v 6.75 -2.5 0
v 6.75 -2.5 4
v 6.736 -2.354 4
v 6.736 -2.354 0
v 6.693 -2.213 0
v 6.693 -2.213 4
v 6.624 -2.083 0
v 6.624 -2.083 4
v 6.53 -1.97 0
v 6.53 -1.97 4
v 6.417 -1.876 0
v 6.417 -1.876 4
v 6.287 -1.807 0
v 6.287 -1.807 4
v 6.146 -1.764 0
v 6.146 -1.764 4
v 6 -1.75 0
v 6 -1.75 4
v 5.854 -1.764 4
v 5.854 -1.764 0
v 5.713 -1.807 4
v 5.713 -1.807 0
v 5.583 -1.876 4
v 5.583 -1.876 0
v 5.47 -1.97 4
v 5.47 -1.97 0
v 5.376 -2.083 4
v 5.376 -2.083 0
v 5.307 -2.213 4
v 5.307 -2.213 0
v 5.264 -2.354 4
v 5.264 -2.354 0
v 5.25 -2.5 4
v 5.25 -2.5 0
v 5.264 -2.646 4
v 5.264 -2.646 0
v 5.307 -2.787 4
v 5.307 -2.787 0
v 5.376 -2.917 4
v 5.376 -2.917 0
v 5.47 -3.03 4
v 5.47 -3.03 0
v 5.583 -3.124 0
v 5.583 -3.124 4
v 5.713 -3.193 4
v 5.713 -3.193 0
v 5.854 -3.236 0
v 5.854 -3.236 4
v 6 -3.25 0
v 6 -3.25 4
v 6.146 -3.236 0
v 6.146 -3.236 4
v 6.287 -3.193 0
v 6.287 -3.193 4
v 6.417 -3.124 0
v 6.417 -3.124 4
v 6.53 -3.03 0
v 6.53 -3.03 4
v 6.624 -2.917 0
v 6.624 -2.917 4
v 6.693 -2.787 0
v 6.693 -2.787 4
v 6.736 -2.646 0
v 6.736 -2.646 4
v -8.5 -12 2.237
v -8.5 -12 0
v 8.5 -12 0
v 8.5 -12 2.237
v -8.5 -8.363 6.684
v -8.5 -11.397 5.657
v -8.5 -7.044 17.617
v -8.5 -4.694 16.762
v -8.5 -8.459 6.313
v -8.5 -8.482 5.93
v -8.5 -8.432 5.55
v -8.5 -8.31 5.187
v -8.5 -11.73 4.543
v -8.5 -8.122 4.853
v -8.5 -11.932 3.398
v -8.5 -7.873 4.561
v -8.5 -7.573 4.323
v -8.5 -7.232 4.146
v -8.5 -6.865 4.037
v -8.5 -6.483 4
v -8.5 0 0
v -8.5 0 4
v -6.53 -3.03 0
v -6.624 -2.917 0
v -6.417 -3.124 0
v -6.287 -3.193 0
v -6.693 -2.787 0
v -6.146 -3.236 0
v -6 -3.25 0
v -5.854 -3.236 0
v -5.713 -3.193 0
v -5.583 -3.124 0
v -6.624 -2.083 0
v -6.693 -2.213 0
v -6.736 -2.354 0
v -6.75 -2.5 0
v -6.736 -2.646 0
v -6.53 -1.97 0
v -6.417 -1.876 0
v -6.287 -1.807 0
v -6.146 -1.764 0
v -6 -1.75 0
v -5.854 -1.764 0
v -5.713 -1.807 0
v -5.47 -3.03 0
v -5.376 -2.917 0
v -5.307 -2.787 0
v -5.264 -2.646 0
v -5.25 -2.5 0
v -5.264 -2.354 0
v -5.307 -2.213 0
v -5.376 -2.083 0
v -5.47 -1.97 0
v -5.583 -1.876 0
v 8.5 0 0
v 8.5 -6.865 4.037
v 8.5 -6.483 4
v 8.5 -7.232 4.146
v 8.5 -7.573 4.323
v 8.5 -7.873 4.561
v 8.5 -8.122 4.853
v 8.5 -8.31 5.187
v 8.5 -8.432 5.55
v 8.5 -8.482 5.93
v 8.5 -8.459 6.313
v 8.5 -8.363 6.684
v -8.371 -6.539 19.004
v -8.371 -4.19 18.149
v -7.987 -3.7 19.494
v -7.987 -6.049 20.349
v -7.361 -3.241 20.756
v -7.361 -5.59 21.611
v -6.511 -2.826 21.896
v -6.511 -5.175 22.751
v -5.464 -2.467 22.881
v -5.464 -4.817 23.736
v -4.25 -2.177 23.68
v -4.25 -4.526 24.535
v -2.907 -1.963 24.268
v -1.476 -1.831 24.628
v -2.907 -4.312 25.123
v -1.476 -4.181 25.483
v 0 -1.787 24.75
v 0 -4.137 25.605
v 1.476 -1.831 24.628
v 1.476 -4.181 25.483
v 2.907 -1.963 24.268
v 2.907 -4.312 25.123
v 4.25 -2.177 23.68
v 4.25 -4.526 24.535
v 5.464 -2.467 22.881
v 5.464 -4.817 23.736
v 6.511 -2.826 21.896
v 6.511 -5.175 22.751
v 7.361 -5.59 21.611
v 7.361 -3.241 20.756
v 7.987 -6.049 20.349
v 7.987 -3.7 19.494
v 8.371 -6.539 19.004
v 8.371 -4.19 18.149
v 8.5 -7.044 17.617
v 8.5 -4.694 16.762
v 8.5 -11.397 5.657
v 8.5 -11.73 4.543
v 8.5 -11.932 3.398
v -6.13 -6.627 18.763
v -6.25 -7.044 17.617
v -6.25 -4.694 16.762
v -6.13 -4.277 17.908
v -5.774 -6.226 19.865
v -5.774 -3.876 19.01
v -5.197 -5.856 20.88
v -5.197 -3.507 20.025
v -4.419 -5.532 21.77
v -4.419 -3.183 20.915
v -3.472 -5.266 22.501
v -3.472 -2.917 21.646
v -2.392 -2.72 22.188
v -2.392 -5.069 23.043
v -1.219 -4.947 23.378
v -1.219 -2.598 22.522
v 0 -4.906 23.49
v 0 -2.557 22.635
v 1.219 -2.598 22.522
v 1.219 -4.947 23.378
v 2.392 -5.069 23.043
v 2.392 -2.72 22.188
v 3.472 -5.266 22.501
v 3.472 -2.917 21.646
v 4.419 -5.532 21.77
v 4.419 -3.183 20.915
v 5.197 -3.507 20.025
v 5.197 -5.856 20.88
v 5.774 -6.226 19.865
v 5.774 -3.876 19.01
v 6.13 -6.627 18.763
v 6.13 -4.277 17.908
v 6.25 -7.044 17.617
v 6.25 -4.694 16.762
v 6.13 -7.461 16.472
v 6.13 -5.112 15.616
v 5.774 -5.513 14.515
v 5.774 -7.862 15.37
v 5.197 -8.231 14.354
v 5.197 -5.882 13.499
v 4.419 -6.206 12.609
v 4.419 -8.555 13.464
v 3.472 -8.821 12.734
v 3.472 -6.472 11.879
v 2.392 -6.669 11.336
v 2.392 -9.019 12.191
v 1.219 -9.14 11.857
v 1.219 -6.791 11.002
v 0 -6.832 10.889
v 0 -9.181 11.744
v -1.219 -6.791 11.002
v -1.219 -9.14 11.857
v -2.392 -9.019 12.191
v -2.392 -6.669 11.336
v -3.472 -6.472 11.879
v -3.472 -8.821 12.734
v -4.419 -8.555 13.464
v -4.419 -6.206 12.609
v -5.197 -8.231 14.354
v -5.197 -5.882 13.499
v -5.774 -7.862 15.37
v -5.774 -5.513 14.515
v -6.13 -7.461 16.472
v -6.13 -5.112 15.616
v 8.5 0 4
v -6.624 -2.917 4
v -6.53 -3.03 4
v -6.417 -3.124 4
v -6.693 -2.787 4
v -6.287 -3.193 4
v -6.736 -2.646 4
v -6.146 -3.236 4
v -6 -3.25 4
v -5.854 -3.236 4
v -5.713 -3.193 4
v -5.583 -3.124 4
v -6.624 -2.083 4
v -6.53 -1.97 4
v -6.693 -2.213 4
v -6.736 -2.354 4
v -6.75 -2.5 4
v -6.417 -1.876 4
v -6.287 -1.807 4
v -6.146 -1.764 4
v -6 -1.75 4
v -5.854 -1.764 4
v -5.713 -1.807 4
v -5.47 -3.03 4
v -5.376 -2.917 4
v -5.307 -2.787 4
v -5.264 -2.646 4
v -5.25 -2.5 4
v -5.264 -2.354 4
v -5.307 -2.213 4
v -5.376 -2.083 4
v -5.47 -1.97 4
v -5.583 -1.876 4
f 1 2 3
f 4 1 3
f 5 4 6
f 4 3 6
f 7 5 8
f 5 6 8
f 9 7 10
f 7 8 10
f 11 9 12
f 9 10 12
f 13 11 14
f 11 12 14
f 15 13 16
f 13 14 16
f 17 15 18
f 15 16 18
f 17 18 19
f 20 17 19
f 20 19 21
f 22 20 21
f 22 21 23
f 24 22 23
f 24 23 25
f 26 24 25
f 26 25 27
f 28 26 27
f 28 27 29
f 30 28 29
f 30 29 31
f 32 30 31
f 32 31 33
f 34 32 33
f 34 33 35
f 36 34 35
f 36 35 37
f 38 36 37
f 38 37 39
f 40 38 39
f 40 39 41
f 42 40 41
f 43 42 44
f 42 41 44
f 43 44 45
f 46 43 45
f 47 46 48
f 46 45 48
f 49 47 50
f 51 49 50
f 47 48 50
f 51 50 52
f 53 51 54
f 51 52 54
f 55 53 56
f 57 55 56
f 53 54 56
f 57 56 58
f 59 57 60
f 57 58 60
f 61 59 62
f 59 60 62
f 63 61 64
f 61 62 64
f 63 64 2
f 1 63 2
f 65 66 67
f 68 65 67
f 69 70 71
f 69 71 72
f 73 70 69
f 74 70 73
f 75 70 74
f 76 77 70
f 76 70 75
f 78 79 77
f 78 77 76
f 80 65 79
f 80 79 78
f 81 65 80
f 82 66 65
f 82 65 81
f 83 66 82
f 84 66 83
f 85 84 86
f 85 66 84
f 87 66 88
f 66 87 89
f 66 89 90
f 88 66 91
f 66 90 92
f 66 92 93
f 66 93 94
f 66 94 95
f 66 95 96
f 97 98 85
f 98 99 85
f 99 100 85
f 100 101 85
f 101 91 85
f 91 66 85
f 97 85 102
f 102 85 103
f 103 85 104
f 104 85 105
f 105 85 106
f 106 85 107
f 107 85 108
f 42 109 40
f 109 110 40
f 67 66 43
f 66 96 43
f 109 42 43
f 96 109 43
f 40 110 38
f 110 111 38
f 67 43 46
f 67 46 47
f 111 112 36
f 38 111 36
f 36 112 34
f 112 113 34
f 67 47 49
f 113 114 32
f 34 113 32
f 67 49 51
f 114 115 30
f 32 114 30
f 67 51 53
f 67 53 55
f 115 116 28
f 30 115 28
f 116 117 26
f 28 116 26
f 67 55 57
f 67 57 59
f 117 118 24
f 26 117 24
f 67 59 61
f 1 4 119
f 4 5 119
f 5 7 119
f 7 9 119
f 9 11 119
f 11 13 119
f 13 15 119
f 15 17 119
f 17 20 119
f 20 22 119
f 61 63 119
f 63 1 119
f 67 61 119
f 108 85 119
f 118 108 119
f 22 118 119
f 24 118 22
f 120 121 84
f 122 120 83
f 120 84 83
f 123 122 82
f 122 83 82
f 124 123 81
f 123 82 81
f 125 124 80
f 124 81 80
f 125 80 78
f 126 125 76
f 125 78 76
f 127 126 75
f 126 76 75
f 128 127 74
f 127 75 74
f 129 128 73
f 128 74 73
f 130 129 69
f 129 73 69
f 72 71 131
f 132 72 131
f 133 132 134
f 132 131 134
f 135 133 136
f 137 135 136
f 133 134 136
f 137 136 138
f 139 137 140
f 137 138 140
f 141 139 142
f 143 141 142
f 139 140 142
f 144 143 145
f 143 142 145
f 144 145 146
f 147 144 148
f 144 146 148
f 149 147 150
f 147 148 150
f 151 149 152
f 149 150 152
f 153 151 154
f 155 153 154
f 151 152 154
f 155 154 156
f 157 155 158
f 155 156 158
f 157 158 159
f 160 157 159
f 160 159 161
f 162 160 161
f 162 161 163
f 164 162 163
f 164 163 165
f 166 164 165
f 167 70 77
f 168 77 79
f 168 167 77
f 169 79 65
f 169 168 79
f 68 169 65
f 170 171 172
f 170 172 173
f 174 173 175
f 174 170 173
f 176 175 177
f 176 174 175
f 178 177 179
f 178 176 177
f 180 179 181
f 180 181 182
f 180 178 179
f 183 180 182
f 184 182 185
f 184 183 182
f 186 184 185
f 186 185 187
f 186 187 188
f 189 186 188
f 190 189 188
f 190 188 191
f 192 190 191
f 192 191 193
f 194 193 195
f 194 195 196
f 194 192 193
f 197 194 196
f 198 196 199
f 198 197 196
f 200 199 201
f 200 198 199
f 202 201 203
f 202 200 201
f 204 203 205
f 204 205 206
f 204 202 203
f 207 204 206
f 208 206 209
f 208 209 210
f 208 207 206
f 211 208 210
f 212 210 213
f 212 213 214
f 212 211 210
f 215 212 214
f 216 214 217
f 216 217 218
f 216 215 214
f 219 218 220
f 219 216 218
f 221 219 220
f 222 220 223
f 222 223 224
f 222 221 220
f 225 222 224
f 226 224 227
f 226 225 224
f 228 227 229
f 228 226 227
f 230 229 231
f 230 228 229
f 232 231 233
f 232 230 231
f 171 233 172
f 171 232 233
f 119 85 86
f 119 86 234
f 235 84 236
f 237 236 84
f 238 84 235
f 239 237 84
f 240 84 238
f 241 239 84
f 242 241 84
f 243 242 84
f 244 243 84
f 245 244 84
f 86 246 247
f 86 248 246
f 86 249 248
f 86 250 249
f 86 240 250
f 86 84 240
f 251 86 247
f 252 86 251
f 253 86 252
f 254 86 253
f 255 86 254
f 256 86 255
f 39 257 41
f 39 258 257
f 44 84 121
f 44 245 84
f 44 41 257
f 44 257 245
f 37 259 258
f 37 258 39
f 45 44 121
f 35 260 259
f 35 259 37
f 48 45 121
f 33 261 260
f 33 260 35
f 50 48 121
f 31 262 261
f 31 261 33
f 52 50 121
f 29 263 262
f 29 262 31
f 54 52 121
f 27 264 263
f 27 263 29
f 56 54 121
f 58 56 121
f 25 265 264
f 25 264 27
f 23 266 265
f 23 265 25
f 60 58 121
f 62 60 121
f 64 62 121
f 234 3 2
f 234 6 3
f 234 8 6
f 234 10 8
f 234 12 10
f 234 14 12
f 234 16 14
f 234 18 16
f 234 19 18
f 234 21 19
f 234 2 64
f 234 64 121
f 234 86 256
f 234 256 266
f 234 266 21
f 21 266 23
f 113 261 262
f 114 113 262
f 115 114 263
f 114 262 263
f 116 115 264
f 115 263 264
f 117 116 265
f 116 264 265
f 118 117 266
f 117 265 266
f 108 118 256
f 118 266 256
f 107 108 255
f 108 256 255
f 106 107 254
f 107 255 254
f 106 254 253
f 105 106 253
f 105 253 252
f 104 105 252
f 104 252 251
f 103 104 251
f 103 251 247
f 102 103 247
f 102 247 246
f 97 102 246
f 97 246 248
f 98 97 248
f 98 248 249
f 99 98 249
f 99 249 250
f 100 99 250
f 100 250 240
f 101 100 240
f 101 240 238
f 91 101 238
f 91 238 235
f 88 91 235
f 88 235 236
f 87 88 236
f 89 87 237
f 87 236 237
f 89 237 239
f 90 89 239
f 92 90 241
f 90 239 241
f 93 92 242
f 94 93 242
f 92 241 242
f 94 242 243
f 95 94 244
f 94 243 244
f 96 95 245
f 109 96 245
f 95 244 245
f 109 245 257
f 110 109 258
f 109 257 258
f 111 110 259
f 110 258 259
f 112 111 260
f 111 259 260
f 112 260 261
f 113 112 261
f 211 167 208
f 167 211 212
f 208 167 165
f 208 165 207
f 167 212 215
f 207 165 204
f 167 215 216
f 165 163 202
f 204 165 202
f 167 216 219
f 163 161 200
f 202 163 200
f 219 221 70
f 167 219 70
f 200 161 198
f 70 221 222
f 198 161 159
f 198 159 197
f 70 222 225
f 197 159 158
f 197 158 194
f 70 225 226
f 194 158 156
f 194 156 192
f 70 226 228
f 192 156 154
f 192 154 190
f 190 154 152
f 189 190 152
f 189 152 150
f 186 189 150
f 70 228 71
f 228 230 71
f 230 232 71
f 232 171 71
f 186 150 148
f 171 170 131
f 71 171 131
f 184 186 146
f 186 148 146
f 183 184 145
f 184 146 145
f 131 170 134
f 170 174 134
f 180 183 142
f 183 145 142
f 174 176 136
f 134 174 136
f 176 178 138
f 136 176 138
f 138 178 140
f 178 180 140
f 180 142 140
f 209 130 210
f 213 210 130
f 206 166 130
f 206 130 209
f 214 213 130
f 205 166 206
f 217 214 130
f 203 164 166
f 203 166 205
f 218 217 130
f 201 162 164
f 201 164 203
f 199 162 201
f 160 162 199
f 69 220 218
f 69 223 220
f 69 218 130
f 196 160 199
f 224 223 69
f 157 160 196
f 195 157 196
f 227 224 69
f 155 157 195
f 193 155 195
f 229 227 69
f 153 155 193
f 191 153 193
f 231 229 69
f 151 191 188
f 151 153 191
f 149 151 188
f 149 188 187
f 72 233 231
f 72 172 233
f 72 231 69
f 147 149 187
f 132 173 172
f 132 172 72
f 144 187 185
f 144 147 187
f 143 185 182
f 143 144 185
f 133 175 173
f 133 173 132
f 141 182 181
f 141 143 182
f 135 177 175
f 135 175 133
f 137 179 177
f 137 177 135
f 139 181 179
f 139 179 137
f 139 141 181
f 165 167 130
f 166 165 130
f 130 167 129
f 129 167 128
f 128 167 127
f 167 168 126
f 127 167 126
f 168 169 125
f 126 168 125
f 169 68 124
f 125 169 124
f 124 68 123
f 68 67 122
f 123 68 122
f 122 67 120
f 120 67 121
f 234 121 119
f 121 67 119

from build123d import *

# Parameters (mm, degrees)
F0_W     = 17
F0_H     = 12
F1_DEPTH = 4
F2_R     = 0.75
F3_DEPTH = 25
F5_R     = 6.25
F6_DEPTH = 2.5
F7_R     = 2
F8_R     = 10


with BuildPart() as f1:
    # F0 (on Top) → F1 (new body)
    with BuildSketch(Plane.XY):
        with Locations((0, -6)):
            Rectangle(F0_W, F0_H)
    extrude(amount=F1_DEPTH)

    # F2 (on face) → F3 (cut)
    with BuildSketch(Plane.XY.offset(4)):
        with Locations((-6, -2.5)):
            Circle(F2_R)
        with Locations((6, -2.5)):
            Circle(F2_R)
    extrude(amount=-F3_DEPTH, mode=Mode.SUBTRACT)

    # F5 (on face) → F6 (join)
    with BuildSketch(Plane(origin=(0, -11.8818418781, 4.3246367719), x_dir=(-1, 0, 0), z_dir=(0, 0.9396926208, -0.3420201433))):
        with BuildLine():
            Line((-8.5, -0.3454712368), (8.5, -0.3454712368))
            Line((8.5, -0.3454712368), (8.5, 14.1457582801))
            ThreePointArc((8.5, 14.1457582801), (0, 22.6457582801), (-8.5, 14.1457582801))
            Line((-8.5, 14.1457582801), (-8.5, -0.3454712368))
        make_face()
        with Locations((0, 14.1457582801)):
            Circle(F5_R, mode=Mode.SUBTRACT)
    extrude(amount=F6_DEPTH)

    # F7
    f7_edges = [f1.edges().sort_by_distance(p)[0] for p in [
        (0, -9.339556, 4),
    ]]
    fillet(f7_edges, radius=F7_R)

    # F8
    f8_edges = [f1.edges().sort_by_distance(p)[0] for p in [
        (0, -12, 4),
    ]]
    fillet(f8_edges, radius=F8_R)


solid = f1.part
